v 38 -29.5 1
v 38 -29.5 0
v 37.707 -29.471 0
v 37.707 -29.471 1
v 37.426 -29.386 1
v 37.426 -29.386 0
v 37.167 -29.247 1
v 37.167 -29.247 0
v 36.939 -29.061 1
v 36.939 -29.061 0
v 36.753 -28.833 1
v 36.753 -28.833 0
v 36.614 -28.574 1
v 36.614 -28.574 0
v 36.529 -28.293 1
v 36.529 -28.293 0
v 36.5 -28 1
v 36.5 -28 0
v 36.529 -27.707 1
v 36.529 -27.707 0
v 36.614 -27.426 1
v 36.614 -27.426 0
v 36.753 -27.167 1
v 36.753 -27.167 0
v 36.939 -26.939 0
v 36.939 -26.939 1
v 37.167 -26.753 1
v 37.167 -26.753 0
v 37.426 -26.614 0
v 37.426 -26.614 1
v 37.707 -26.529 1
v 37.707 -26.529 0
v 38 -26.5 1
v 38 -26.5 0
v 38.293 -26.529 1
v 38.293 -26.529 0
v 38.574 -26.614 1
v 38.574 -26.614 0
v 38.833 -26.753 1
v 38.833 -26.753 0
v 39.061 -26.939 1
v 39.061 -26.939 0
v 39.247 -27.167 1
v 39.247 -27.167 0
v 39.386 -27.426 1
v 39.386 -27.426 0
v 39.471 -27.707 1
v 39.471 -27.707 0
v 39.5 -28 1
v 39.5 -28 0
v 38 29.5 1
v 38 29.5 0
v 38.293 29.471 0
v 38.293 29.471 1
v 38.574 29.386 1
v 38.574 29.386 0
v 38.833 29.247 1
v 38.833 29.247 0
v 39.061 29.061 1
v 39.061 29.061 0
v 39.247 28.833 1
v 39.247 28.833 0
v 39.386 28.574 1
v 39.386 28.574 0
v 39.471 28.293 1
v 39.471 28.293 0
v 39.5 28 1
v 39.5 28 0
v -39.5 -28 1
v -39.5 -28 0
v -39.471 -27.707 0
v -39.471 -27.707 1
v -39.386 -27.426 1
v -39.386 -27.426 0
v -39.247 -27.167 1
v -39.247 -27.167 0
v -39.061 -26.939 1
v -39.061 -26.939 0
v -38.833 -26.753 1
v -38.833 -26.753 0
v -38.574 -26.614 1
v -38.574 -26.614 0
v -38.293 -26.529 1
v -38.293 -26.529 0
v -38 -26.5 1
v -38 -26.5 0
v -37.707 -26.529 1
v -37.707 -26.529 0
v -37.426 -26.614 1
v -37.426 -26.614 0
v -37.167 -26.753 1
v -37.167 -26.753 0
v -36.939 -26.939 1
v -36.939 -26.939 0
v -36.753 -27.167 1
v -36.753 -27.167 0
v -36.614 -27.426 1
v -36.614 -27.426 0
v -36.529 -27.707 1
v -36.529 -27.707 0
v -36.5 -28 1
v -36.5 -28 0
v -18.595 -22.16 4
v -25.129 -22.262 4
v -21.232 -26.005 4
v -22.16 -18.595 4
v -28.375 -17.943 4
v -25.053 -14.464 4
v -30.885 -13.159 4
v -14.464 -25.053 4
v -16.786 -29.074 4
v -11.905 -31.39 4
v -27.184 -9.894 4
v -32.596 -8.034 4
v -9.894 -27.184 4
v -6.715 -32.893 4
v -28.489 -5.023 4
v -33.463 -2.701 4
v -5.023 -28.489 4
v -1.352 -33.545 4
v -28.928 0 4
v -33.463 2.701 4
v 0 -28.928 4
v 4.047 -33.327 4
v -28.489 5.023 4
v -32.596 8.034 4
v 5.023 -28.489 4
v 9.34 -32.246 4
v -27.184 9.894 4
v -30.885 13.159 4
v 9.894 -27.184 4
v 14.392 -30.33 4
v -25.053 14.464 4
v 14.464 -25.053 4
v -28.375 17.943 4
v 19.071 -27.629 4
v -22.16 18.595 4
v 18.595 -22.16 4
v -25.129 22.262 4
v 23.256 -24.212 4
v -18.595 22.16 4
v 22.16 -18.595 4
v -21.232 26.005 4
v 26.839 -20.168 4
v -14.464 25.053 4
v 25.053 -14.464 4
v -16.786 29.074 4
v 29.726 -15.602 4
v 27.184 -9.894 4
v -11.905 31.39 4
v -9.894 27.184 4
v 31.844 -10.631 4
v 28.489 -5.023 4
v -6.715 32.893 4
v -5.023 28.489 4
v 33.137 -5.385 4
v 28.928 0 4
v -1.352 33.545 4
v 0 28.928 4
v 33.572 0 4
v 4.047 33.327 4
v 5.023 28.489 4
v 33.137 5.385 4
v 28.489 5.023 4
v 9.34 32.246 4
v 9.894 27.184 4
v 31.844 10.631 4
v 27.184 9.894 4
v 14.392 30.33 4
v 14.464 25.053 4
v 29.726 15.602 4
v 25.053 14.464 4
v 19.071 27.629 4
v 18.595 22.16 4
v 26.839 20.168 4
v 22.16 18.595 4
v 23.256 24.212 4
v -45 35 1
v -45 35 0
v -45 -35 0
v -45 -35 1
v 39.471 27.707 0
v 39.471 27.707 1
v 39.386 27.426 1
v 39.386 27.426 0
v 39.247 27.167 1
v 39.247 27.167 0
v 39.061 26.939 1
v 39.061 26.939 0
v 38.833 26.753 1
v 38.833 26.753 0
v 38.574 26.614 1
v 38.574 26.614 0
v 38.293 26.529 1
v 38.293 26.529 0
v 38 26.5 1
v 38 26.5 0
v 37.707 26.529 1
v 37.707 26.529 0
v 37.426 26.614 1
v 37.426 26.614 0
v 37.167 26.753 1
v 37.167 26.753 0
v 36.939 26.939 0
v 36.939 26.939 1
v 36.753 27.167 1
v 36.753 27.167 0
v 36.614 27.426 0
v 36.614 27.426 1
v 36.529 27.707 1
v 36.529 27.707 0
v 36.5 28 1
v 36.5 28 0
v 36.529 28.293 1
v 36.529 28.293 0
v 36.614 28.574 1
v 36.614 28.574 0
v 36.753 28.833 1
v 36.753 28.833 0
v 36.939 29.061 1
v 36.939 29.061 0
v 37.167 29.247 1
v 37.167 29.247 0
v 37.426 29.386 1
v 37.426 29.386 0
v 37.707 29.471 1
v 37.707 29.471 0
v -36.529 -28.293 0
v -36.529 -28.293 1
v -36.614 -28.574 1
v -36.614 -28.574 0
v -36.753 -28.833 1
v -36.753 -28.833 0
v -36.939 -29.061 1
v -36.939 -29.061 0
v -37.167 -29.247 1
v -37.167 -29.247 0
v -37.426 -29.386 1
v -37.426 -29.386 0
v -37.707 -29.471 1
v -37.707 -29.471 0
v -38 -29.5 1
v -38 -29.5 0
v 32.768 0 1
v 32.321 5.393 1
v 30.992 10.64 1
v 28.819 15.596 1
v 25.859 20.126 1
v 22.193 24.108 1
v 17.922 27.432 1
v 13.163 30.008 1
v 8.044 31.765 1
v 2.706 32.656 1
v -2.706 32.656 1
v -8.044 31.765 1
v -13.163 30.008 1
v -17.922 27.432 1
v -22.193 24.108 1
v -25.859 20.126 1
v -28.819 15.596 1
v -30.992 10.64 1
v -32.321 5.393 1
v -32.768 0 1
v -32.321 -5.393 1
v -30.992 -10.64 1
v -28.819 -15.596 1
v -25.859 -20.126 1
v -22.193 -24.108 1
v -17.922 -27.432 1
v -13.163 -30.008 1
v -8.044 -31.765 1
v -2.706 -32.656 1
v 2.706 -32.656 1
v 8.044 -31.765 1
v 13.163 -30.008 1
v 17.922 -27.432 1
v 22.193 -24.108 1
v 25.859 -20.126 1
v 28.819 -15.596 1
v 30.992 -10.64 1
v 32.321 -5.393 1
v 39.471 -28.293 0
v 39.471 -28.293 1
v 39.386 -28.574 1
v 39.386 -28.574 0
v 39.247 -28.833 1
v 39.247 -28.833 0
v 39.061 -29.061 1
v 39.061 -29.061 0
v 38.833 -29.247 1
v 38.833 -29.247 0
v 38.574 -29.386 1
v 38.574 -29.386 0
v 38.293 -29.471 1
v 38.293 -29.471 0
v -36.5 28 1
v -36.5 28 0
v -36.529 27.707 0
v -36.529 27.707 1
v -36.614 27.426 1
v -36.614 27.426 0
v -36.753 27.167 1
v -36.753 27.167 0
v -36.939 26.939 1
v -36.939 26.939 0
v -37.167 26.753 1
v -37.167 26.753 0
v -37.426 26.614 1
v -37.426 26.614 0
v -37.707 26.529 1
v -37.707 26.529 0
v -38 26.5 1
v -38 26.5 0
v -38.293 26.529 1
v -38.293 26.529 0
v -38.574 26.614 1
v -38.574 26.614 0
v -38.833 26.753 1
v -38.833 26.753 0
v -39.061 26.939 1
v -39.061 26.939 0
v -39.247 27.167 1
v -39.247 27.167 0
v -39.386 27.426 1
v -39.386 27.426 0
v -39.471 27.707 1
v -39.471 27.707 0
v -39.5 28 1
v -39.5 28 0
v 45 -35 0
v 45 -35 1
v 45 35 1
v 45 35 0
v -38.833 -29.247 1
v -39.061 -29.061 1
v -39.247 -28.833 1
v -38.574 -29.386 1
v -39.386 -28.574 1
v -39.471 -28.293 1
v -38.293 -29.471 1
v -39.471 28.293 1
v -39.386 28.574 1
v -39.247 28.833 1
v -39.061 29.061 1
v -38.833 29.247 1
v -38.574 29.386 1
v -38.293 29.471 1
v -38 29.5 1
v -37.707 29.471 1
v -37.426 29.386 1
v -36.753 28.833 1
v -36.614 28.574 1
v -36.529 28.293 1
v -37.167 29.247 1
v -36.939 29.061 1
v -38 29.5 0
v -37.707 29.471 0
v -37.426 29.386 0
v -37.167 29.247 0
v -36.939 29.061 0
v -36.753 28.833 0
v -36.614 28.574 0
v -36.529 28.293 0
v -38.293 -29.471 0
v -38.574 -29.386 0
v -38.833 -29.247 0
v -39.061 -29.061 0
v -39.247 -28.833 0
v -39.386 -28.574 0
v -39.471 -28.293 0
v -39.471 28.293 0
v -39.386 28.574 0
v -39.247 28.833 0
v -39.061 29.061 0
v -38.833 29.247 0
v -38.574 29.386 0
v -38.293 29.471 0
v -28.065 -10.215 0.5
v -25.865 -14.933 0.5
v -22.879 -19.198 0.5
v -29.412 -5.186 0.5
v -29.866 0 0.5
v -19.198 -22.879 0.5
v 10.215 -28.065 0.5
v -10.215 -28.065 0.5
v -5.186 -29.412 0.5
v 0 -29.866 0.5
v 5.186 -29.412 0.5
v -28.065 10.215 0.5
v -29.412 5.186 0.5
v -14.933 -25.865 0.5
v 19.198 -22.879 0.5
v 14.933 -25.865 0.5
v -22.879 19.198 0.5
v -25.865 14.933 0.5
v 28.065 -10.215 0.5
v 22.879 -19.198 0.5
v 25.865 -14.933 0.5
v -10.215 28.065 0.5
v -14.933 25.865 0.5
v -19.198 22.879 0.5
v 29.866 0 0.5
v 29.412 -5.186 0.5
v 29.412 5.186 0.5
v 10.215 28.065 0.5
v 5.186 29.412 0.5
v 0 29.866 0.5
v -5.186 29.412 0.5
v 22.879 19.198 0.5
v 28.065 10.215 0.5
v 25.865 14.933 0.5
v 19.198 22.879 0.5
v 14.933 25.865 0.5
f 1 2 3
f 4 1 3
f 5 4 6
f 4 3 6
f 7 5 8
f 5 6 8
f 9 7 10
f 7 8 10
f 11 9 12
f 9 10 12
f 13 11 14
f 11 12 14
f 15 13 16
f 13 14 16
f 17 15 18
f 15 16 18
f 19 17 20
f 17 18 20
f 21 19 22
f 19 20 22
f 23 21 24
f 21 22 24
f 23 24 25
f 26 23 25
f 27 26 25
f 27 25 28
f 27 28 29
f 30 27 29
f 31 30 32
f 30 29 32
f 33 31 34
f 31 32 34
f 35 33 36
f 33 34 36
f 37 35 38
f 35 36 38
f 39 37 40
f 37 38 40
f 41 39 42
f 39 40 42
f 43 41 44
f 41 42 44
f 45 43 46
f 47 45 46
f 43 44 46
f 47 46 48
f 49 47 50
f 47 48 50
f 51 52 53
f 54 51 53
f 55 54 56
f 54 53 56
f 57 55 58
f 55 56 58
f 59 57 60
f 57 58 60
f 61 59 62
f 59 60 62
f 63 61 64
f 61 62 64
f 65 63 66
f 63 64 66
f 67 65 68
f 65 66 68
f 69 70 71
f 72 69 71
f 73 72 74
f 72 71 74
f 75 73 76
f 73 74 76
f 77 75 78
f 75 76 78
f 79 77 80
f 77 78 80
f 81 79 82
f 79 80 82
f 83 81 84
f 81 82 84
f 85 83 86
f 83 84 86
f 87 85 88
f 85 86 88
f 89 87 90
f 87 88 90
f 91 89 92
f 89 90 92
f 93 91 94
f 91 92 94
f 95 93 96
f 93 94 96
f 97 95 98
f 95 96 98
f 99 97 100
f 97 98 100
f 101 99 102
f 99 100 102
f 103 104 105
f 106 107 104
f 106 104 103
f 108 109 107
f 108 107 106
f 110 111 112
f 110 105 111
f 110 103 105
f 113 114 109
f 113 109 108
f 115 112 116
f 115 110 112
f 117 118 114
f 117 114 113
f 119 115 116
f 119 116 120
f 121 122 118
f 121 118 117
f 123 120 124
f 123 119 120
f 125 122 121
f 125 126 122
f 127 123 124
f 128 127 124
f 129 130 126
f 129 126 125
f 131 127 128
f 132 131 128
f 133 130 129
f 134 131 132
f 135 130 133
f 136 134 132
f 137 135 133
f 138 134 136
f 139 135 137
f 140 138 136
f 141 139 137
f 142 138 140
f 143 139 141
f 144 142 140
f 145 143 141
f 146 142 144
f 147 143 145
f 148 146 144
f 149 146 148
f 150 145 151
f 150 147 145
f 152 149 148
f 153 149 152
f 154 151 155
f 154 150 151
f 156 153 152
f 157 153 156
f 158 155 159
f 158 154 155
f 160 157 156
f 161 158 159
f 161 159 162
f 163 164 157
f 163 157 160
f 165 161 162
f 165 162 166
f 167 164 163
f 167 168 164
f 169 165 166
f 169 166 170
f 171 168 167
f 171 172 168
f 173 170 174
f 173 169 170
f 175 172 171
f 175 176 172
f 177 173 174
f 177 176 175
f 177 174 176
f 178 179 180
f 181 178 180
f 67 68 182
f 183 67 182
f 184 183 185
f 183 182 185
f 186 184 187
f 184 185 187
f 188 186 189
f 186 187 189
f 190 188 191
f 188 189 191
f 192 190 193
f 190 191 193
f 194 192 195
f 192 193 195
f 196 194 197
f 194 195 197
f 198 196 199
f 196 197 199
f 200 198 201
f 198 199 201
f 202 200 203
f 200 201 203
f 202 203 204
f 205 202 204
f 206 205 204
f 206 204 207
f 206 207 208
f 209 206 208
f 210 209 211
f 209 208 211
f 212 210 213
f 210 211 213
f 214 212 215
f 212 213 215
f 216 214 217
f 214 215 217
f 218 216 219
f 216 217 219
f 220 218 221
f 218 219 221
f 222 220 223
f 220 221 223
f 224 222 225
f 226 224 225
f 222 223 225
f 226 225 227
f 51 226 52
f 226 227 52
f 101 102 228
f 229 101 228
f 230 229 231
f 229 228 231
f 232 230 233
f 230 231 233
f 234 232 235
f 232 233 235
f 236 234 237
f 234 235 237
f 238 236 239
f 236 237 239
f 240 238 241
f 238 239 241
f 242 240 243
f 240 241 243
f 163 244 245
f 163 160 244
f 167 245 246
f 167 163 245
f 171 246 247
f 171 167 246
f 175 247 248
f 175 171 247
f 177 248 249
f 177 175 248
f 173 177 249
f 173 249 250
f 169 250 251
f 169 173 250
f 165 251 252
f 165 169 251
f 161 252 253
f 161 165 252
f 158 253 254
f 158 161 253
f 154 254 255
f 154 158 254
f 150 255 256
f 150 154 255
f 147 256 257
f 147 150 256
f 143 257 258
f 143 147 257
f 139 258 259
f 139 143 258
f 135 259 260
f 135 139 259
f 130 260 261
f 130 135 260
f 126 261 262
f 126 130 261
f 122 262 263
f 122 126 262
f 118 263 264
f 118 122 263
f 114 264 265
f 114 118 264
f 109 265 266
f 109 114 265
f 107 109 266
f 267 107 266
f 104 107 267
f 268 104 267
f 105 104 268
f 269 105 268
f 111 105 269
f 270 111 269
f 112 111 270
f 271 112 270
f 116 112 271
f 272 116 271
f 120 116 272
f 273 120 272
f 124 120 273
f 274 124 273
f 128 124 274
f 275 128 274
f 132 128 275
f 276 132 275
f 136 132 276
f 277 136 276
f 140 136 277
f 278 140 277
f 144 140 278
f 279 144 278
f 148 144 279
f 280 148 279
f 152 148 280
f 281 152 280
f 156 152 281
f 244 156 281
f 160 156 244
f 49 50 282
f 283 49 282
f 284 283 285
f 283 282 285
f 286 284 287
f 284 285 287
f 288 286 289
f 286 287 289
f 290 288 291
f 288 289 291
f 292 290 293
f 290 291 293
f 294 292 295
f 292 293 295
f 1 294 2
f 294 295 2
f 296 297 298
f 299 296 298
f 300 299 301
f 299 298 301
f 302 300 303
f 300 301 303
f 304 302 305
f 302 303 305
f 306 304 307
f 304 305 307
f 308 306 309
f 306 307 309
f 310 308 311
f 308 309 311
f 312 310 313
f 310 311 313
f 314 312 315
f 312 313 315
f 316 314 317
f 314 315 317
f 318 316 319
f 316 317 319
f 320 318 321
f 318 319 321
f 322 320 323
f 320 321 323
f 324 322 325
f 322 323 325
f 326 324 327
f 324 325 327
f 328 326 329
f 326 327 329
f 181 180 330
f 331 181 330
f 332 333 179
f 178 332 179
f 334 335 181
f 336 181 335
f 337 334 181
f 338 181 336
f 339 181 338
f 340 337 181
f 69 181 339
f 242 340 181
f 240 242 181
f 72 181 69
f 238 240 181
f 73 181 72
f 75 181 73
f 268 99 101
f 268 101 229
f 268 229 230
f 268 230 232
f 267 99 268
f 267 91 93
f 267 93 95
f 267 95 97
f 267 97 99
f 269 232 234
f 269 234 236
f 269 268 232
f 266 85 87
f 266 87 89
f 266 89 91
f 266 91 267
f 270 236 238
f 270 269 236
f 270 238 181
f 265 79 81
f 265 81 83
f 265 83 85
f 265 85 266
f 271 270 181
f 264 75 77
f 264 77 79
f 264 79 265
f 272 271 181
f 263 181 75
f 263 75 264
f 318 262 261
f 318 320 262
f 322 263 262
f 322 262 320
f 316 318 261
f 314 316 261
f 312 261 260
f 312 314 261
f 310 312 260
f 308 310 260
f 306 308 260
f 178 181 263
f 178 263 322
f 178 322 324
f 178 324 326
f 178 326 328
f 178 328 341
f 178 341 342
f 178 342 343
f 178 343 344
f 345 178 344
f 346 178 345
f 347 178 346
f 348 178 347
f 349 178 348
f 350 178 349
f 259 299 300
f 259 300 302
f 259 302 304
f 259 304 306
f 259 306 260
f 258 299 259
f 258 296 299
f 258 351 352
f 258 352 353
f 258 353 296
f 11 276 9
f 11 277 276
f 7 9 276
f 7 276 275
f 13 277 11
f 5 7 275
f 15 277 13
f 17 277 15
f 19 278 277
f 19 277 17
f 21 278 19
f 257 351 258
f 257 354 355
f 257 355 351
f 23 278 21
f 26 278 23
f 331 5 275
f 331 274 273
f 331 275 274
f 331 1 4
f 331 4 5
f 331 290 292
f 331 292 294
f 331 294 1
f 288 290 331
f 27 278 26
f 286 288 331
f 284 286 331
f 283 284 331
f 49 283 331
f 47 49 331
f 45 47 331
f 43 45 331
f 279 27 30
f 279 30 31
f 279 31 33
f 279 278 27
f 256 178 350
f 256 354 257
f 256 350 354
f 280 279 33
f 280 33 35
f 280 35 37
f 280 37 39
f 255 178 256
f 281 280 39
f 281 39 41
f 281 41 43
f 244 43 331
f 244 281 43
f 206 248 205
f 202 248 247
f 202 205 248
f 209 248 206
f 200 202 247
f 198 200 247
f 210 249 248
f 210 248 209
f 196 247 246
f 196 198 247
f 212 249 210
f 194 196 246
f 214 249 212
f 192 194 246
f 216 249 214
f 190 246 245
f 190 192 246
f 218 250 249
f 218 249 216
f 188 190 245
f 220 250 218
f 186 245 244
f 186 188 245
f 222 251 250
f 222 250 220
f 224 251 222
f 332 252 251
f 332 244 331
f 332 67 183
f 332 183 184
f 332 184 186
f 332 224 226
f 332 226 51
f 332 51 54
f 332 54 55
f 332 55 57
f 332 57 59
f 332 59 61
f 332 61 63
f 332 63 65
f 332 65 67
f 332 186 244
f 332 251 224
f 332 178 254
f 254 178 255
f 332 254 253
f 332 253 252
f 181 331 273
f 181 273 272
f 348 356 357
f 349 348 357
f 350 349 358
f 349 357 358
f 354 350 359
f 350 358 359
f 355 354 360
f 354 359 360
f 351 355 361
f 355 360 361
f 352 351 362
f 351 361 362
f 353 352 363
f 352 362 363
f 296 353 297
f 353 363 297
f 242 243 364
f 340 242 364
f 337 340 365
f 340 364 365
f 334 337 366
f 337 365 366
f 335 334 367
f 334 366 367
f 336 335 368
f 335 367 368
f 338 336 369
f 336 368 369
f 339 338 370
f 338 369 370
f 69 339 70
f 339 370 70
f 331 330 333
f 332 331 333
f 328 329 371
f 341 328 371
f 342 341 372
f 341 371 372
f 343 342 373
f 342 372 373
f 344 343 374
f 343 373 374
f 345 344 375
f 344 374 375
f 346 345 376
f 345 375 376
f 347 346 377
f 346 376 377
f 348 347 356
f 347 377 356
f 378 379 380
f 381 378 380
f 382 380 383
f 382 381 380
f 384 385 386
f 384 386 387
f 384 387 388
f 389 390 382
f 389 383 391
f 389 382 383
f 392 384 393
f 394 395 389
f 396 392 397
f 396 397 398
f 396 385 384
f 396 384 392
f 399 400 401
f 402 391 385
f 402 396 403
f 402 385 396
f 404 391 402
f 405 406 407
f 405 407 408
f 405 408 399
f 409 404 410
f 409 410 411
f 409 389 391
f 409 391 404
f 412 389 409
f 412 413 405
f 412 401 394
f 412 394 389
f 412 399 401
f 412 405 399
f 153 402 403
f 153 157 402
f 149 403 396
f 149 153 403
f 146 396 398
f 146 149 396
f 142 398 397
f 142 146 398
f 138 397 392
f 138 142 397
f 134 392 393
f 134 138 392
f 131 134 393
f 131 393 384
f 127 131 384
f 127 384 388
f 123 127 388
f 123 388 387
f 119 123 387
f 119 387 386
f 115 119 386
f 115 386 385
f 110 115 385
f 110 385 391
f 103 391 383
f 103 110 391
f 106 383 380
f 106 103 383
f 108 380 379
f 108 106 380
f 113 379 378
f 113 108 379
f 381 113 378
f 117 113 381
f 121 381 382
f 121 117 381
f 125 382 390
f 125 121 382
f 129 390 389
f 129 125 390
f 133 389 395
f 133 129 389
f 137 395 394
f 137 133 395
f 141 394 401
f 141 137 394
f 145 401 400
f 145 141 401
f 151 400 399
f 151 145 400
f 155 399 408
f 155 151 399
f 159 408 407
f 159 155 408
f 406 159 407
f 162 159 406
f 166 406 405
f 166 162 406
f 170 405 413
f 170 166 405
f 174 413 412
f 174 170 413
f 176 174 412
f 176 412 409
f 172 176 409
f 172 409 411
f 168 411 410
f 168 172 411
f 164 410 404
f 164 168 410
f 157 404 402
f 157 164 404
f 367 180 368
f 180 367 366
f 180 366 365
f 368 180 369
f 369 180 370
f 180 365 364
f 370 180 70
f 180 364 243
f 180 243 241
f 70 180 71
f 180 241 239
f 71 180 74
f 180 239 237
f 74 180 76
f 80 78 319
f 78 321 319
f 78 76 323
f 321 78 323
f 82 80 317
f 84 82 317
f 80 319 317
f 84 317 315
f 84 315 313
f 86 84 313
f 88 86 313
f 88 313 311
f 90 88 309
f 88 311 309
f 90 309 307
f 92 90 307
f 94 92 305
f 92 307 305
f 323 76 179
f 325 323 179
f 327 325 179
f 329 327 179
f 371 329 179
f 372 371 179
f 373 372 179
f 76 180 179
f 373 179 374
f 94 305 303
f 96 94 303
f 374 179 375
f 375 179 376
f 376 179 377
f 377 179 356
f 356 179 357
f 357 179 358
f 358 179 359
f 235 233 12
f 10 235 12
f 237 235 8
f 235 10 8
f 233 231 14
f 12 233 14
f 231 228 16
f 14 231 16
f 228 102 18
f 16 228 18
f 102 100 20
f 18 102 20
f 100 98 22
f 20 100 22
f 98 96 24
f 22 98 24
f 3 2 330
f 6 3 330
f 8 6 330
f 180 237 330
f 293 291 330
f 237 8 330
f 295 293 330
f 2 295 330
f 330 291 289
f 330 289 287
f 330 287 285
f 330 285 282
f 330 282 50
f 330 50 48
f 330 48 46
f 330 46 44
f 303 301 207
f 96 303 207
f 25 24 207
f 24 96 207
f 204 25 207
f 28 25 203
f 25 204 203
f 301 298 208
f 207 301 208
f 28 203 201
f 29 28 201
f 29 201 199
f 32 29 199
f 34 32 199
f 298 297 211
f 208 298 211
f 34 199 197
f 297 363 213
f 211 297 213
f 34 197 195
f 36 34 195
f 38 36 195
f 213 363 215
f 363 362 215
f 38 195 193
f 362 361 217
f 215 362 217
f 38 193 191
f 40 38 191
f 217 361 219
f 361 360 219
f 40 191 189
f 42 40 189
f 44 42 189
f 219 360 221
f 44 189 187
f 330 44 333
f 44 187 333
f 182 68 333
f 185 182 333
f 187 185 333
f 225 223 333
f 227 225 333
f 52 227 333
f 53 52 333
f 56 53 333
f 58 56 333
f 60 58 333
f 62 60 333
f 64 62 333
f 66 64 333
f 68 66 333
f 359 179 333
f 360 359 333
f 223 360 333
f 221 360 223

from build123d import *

# Parameters (mm, degrees)
F0_R     = 32.5
F1_DEPTH = 1
F0_R_2   = 30
F2_DEPTH = 0.5
F3_DEPTH = 4
F3_TAPER = -15


with BuildPart() as f1:
    # F0 (on Top) → F1 (new body)
    with BuildSketch(Plane.XY):
        with BuildLine():
            Line((-38, -35), (38, -35))
            Line((38, -35), (38, -29.5))
            ThreePointArc((38, -29.5), (36.9393398282, -26.9393398282), (39.5, -28))
            Line((39.5, -28), (45, -28))
            Line((45, -28), (45, 28))
            Line((45, 28), (39.5, 28))
            ThreePointArc((39.5, 28), (36.9393398282, 26.9393398282), (38, 29.5))
            Line((38, 29.5), (38, 35))
            Line((38, 35), (-38, 35))
            Line((-38, 35), (-38, 29.5))
            ThreePointArc((-38, 29.5), (-36.9393398282, 29.0606601718), (-36.5, 28))
            ThreePointArc((-36.5, 28), (-38, 26.5), (-39.5, 28))
            Line((-39.5, 28), (-45, 28))
            Line((-45, 28), (-45, -28))
            Line((-45, -28), (-39.5, -28))
            ThreePointArc((-39.5, -28), (-38, -26.5), (-36.5, -28))
            ThreePointArc((-36.5, -28), (-36.9393398282, -29.0606601718), (-38, -29.5))
            Line((-38, -29.5), (-38, -35))
        make_face()
        Circle(F0_R, mode=Mode.SUBTRACT)
        with BuildLine():
            Line((-45, 35), (-45, 28))
            Line((-45, 28), (-39.5, 28))
            ThreePointArc((-39.5, 28), (-39.0606601718, 29.0606601718), (-38, 29.5))
            Line((-38, 29.5), (-38, 35))
            Line((-38, 35), (-45, 35))
        make_face()
        with BuildLine():
            Line((39.5, 28), (45, 28))
            Line((45, 28), (45, 35))
            Line((45, 35), (38, 35))
            Line((38, 35), (38, 29.5))
            ThreePointArc((38, 29.5), (39.0606601718, 29.0606601718), (39.5, 28))
        make_face()
        with BuildLine():
            Line((38, -35), (45, -35))
            Line((45, -35), (45, -28))
            Line((45, -28), (39.5, -28))
            ThreePointArc((39.5, -28), (39.0606601718, -29.0606601718), (38, -29.5))
            Line((38, -29.5), (38, -35))
        make_face()
        with BuildLine():
            Line((-45, -35), (-38, -35))
            Line((-38, -35), (-38, -29.5))
            ThreePointArc((-38, -29.5), (-39.0606601718, -29.0606601718), (-39.5, -28))
            Line((-39.5, -28), (-45, -28))
            Line((-45, -28), (-45, -35))
        make_face()
    extrude(amount=F1_DEPTH)



with BuildPart() as f2:
    # F0 (on Top) → F2 (new body)
    with BuildSketch(Plane.XY):
        Circle(F0_R_2)
    extrude(amount=F2_DEPTH)


with BuildPart() as f1_1:
    add(f1.part)

    add(f2.part)  # F3 merges F2
    # F0 (on Top) → F3 (join)
    with BuildSketch(Plane.XY):
        Circle(F0_R)
        Circle(F0_R_2, mode=Mode.SUBTRACT)
    extrude(amount=F3_DEPTH, taper=F3_TAPER)


solid = f1_1.part
